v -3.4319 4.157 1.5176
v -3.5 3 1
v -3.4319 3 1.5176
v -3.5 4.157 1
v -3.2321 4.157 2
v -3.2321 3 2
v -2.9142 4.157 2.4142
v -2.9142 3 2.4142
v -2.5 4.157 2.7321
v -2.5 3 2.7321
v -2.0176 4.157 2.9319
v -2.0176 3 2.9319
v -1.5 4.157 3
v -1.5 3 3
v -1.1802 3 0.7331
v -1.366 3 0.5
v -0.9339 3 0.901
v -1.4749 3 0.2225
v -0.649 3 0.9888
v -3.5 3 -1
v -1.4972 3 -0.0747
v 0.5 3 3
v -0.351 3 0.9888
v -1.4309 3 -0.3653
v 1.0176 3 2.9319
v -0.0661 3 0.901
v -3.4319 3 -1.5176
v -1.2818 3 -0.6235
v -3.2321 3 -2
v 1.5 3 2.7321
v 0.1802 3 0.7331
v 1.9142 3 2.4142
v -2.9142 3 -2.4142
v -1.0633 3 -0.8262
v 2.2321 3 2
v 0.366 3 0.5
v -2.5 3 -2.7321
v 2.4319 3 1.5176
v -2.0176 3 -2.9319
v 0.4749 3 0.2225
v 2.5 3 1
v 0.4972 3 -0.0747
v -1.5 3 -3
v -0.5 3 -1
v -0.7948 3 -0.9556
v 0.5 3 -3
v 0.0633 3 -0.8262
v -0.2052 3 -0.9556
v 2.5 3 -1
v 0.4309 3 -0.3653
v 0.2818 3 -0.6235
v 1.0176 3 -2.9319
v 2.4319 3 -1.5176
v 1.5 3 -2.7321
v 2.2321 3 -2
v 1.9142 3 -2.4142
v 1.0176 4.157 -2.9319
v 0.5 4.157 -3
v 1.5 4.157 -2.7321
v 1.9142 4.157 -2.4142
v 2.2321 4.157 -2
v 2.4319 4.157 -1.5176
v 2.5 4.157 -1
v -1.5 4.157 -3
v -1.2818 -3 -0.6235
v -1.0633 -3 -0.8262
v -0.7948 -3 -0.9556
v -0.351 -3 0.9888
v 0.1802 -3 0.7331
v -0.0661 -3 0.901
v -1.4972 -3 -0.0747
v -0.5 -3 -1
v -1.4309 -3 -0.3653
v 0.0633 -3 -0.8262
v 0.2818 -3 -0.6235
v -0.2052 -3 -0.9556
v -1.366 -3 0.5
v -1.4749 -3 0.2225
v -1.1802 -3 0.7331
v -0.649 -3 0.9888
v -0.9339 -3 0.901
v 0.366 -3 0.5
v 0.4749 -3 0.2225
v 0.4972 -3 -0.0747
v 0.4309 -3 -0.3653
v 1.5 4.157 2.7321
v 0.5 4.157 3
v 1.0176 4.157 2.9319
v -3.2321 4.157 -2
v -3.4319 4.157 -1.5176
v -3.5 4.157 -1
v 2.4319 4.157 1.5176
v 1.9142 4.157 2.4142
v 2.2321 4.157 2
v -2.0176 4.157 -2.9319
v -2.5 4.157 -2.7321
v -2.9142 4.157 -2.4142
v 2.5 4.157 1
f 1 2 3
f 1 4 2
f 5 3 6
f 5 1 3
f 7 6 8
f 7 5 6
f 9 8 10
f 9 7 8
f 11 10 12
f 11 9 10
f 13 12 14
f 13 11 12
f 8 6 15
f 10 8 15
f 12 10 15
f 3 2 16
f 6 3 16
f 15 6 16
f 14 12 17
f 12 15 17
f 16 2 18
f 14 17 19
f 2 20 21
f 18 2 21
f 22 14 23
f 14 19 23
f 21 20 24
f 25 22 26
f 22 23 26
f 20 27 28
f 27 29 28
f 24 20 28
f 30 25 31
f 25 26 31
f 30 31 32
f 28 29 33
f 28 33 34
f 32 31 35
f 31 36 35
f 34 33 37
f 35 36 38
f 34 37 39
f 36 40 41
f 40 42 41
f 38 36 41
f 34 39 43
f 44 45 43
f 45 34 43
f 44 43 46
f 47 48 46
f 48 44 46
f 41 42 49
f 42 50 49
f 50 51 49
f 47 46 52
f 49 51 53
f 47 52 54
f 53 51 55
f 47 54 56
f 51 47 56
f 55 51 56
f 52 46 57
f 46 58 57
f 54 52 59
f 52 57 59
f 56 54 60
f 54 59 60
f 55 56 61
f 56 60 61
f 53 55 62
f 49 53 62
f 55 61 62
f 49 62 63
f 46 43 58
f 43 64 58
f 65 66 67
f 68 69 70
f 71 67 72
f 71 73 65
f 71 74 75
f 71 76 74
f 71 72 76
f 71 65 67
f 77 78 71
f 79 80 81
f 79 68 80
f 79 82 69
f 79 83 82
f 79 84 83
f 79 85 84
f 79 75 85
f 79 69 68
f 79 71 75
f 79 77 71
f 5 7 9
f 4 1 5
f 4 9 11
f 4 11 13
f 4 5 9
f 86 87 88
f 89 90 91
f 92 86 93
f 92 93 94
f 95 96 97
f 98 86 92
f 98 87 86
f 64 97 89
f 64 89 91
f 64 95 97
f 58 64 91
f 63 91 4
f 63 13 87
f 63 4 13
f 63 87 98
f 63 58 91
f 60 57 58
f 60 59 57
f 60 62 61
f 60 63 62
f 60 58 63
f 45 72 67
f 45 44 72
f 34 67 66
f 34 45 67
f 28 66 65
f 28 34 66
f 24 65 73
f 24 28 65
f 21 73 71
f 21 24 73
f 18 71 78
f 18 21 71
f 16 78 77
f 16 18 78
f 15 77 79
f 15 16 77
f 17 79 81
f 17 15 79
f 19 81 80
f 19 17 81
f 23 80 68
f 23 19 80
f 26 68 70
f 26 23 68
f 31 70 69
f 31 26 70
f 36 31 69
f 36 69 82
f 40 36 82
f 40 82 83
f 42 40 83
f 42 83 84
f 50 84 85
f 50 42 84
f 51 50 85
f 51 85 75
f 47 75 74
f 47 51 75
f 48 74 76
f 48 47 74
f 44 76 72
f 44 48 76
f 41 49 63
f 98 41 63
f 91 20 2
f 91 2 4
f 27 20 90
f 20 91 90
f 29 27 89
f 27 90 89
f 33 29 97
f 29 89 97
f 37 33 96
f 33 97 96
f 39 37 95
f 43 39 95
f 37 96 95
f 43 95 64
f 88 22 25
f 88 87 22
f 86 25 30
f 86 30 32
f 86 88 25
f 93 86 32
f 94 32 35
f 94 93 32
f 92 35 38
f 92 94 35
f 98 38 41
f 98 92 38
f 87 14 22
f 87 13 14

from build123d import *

# Parameters (mm, degrees)
SKETCH1_W                = 1
SKETCH1_H                = 6
BOSS_EXTRUDE1_DEPTH      = 3
BOSS_EXTRUDE1_DEPTH_BACK = 3
SKETCH9_W                = 6
SKETCH9_H                = 1.15698482
FILLET1_R                = 2


with BuildPart() as part:
    # Sketch1 → Revolve3 (revolve)
    with BuildSketch(Plane.XY):
        Rectangle(SKETCH1_W, SKETCH1_H)
    revolve(axis=Axis((-0.5, -3, 0), (0, 1, 0)))

    # Sketch9 → Boss-Extrude1 (add, two sides: drawn at the far end of the back side and taken through both)
    with BuildSketch(Plane.XY.offset(-BOSS_EXTRUDE1_DEPTH_BACK)):
        with Locations((-0.5, 3.57849241)):
            Rectangle(SKETCH9_W, SKETCH9_H)
    extrude(amount=BOSS_EXTRUDE1_DEPTH + BOSS_EXTRUDE1_DEPTH_BACK)

    # Fillet1
    fillet1_edges = [part.edges().sort_by_distance(p)[0] for p in [
        (-3.5, 3.57849241, -3),
        (2.5, 3.57849241, -3),
        (2.5, 3.57849241, 3),
        (-3.5, 3.57849241, 3),
    ]]
    fillet(fillet1_edges, radius=FILLET1_R)


solid = part.part
